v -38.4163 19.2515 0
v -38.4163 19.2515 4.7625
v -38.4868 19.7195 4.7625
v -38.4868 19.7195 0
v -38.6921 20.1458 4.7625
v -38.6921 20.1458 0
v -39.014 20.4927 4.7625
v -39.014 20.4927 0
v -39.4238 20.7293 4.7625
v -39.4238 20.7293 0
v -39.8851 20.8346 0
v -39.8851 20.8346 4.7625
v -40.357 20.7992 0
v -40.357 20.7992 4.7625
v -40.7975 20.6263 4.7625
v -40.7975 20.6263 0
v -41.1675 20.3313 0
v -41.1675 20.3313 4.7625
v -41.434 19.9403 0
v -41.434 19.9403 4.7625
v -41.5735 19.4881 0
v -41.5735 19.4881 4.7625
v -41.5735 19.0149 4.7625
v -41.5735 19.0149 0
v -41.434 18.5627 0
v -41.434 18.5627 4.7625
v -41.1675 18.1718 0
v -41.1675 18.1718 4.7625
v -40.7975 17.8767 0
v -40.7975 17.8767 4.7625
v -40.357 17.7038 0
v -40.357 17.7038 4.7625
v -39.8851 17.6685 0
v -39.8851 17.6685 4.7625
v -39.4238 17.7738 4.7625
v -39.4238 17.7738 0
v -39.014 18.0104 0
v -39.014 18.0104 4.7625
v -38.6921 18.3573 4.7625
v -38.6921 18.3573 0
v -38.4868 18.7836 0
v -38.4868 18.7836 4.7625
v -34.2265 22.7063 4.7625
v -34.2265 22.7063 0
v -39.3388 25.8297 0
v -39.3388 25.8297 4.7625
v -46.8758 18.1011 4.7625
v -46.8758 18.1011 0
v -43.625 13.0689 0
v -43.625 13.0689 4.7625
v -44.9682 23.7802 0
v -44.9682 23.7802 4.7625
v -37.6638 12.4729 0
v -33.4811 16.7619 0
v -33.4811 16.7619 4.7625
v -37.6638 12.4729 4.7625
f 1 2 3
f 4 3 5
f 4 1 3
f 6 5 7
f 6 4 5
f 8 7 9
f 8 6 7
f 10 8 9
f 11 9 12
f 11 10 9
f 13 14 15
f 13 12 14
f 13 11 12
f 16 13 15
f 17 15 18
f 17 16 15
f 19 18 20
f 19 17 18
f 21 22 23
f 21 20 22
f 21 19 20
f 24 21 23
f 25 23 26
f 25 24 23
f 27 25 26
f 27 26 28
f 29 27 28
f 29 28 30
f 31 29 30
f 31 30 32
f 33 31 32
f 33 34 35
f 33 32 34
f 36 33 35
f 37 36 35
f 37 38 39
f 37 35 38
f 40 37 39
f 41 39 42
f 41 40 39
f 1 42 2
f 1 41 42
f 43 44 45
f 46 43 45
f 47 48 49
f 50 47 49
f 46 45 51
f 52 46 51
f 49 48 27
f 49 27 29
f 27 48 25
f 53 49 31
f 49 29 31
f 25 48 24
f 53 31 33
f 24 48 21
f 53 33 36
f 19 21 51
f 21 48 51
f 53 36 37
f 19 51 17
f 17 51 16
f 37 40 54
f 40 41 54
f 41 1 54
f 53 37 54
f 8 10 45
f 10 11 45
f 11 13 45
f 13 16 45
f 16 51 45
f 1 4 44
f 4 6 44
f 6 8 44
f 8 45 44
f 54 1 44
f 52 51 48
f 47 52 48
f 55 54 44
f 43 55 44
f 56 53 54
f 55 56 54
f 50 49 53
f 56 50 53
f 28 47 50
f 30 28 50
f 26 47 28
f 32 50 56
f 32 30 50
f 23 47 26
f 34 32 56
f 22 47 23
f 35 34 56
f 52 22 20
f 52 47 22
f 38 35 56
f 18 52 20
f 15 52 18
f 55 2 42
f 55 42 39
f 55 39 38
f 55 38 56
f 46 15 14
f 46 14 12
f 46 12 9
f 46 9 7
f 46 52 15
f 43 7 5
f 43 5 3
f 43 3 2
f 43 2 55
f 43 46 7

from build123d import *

# Parameters (mm, degrees)
F2_DEPTH = 4.7625
F3_R     = 1.5875
F4_DEPTH = 18.034


with BuildPart() as f2:
    # F0 (on Top) → F2 (new body)
    with BuildSketch(Plane.XY):
        Polygon((-37.663776, 12.472862), (-33.481061, 16.761916), (-34.2265, 22.706276), (-39.33876, 25.829716), (-44.968207, 23.780223), (-46.875751, 18.101107), (-43.624973, 13.068858), align=None)
    extrude(amount=F2_DEPTH)

    # F3 (on Top) → F4 (cut)
    with BuildSketch(Plane.XY):
        with Locations((-40.003754, 19.251533)):
            Circle(F3_R)
    extrude(amount=F4_DEPTH, mode=Mode.SUBTRACT)


solid = f2.part
